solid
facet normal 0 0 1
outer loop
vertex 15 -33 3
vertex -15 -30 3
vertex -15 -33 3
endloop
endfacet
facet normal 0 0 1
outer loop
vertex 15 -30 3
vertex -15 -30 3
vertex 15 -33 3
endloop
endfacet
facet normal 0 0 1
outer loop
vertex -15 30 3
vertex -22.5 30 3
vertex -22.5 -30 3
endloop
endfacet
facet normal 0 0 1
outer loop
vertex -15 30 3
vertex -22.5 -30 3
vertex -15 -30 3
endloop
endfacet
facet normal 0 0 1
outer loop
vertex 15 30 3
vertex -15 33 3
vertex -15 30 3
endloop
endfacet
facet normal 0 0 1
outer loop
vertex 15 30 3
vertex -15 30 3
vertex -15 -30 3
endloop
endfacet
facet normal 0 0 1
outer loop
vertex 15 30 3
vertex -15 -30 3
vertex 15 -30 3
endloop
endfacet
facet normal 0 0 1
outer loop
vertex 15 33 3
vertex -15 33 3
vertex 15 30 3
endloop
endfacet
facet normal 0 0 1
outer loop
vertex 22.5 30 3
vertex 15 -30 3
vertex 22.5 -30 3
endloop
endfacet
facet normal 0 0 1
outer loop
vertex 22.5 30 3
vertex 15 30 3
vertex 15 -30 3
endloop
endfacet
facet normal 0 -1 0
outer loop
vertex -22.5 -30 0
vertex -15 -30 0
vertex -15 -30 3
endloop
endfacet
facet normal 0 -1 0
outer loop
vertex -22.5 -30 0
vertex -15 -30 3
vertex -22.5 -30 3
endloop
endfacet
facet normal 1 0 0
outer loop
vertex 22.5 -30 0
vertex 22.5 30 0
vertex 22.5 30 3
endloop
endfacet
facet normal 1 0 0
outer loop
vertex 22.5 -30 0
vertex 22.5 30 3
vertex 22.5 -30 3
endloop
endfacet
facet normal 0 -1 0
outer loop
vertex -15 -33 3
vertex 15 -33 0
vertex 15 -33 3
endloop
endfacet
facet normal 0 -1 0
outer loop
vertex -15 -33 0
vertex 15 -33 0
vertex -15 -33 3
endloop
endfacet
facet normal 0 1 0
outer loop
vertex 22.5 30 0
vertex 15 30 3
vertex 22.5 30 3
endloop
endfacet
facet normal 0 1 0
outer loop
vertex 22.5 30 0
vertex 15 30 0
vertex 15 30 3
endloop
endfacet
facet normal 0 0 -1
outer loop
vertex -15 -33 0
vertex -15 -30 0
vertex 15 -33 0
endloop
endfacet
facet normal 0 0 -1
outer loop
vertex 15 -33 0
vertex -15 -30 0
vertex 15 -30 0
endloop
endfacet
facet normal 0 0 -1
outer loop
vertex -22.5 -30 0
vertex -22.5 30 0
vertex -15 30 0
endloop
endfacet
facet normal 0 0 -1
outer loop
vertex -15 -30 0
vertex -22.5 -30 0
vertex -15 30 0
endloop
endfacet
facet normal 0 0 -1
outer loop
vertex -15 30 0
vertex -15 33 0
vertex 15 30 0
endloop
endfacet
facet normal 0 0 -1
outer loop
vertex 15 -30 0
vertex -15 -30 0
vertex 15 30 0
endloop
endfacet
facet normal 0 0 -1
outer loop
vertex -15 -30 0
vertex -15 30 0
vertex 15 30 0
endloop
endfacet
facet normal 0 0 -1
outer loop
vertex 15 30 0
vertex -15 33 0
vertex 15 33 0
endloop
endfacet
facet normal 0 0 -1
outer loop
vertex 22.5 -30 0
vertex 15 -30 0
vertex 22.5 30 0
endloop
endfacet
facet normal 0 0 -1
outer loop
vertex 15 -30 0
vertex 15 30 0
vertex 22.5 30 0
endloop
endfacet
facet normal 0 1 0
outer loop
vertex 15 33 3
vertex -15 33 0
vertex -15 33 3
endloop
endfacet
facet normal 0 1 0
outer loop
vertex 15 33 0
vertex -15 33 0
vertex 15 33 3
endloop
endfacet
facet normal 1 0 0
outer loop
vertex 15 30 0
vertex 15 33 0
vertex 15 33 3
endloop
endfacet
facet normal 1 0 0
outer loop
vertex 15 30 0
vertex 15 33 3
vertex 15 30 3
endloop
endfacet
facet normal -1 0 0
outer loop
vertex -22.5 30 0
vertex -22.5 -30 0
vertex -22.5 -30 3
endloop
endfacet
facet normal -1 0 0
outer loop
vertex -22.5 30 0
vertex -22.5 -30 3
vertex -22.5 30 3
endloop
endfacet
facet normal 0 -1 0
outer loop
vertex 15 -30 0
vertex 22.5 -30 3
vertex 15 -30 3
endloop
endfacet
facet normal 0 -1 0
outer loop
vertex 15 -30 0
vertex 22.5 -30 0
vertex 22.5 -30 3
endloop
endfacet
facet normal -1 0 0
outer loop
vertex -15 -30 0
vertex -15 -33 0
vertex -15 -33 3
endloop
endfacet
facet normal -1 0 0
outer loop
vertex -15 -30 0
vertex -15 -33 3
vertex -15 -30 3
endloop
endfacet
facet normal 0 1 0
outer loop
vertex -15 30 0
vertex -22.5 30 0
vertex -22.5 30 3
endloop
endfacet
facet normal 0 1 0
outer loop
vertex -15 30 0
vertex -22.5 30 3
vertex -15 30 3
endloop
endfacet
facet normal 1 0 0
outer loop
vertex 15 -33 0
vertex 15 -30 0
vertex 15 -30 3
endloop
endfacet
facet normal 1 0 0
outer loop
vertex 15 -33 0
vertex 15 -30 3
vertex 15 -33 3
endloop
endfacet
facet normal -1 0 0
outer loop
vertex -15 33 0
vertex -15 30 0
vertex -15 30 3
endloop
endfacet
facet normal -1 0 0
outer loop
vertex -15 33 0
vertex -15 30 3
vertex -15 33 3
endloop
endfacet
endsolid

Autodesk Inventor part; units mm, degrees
ref_plane "YZ Plane" through (0, 0, 0) normal (1, 0, 0) x (0, 1, 0)
ref_plane "XZ Plane" through (0, 0, 0) normal (0, 1, 0) x (-1, 0, 0)
ref_plane "XY Plane" through (0, 0, 0) normal (0, 0, 1) x (1, 0, 0)
sketch "Sketch1" plane through (0, 0, 0) normal (0, 0, 1) x (1, 0, 0)
  line L0 (-22.5, 30) -> (22.5, 30)
  line L1 (22.5, 30) -> (22.5, -30)
  line L2 (22.5, -30) -> (-22.5, -30)
  line L3 (-22.5, -30) -> (-22.5, 30)
  line L4 (-22.5, 30) -> (22.5, -30) construction
  line L5 (22.5, 30) -> (-22.5, -30) construction
  line L6 (-15, 33) -> (15, 33)
  line L7 (15, 33) -> (15, 30)
  line L8 (15, 30) -> (-15, 30)
  line L9 (-15, 30) -> (-15, 33)
  line L10 (-15, 33) -> (15, 30) construction
  line L11 (15, 33) -> (-15, 30) construction
  line L12 (-15, -30) -> (15, -30)
  line L13 (15, -30) -> (15, -33)
  line L14 (15, -33) -> (-15, -33)
  line L15 (-15, -33) -> (-15, -30)
  line L16 (-15, -30) -> (15, -33) construction
  line L17 (15, -30) -> (-15, -33) construction
  point P0 (0, 0)
  point P1 (0, 31.5)
  point P2 (0, -31.5)
  dimension "d0" = 45
  dimension "d1" = 60
  dimension "d2" = 3
  dimension "d3" = 30
extrude "Extrusion1" add sketch "Sketch1" along normal blind 3
properties part number "UNION_SOPORTE" material "MDF Medium Density Fiberboard"
